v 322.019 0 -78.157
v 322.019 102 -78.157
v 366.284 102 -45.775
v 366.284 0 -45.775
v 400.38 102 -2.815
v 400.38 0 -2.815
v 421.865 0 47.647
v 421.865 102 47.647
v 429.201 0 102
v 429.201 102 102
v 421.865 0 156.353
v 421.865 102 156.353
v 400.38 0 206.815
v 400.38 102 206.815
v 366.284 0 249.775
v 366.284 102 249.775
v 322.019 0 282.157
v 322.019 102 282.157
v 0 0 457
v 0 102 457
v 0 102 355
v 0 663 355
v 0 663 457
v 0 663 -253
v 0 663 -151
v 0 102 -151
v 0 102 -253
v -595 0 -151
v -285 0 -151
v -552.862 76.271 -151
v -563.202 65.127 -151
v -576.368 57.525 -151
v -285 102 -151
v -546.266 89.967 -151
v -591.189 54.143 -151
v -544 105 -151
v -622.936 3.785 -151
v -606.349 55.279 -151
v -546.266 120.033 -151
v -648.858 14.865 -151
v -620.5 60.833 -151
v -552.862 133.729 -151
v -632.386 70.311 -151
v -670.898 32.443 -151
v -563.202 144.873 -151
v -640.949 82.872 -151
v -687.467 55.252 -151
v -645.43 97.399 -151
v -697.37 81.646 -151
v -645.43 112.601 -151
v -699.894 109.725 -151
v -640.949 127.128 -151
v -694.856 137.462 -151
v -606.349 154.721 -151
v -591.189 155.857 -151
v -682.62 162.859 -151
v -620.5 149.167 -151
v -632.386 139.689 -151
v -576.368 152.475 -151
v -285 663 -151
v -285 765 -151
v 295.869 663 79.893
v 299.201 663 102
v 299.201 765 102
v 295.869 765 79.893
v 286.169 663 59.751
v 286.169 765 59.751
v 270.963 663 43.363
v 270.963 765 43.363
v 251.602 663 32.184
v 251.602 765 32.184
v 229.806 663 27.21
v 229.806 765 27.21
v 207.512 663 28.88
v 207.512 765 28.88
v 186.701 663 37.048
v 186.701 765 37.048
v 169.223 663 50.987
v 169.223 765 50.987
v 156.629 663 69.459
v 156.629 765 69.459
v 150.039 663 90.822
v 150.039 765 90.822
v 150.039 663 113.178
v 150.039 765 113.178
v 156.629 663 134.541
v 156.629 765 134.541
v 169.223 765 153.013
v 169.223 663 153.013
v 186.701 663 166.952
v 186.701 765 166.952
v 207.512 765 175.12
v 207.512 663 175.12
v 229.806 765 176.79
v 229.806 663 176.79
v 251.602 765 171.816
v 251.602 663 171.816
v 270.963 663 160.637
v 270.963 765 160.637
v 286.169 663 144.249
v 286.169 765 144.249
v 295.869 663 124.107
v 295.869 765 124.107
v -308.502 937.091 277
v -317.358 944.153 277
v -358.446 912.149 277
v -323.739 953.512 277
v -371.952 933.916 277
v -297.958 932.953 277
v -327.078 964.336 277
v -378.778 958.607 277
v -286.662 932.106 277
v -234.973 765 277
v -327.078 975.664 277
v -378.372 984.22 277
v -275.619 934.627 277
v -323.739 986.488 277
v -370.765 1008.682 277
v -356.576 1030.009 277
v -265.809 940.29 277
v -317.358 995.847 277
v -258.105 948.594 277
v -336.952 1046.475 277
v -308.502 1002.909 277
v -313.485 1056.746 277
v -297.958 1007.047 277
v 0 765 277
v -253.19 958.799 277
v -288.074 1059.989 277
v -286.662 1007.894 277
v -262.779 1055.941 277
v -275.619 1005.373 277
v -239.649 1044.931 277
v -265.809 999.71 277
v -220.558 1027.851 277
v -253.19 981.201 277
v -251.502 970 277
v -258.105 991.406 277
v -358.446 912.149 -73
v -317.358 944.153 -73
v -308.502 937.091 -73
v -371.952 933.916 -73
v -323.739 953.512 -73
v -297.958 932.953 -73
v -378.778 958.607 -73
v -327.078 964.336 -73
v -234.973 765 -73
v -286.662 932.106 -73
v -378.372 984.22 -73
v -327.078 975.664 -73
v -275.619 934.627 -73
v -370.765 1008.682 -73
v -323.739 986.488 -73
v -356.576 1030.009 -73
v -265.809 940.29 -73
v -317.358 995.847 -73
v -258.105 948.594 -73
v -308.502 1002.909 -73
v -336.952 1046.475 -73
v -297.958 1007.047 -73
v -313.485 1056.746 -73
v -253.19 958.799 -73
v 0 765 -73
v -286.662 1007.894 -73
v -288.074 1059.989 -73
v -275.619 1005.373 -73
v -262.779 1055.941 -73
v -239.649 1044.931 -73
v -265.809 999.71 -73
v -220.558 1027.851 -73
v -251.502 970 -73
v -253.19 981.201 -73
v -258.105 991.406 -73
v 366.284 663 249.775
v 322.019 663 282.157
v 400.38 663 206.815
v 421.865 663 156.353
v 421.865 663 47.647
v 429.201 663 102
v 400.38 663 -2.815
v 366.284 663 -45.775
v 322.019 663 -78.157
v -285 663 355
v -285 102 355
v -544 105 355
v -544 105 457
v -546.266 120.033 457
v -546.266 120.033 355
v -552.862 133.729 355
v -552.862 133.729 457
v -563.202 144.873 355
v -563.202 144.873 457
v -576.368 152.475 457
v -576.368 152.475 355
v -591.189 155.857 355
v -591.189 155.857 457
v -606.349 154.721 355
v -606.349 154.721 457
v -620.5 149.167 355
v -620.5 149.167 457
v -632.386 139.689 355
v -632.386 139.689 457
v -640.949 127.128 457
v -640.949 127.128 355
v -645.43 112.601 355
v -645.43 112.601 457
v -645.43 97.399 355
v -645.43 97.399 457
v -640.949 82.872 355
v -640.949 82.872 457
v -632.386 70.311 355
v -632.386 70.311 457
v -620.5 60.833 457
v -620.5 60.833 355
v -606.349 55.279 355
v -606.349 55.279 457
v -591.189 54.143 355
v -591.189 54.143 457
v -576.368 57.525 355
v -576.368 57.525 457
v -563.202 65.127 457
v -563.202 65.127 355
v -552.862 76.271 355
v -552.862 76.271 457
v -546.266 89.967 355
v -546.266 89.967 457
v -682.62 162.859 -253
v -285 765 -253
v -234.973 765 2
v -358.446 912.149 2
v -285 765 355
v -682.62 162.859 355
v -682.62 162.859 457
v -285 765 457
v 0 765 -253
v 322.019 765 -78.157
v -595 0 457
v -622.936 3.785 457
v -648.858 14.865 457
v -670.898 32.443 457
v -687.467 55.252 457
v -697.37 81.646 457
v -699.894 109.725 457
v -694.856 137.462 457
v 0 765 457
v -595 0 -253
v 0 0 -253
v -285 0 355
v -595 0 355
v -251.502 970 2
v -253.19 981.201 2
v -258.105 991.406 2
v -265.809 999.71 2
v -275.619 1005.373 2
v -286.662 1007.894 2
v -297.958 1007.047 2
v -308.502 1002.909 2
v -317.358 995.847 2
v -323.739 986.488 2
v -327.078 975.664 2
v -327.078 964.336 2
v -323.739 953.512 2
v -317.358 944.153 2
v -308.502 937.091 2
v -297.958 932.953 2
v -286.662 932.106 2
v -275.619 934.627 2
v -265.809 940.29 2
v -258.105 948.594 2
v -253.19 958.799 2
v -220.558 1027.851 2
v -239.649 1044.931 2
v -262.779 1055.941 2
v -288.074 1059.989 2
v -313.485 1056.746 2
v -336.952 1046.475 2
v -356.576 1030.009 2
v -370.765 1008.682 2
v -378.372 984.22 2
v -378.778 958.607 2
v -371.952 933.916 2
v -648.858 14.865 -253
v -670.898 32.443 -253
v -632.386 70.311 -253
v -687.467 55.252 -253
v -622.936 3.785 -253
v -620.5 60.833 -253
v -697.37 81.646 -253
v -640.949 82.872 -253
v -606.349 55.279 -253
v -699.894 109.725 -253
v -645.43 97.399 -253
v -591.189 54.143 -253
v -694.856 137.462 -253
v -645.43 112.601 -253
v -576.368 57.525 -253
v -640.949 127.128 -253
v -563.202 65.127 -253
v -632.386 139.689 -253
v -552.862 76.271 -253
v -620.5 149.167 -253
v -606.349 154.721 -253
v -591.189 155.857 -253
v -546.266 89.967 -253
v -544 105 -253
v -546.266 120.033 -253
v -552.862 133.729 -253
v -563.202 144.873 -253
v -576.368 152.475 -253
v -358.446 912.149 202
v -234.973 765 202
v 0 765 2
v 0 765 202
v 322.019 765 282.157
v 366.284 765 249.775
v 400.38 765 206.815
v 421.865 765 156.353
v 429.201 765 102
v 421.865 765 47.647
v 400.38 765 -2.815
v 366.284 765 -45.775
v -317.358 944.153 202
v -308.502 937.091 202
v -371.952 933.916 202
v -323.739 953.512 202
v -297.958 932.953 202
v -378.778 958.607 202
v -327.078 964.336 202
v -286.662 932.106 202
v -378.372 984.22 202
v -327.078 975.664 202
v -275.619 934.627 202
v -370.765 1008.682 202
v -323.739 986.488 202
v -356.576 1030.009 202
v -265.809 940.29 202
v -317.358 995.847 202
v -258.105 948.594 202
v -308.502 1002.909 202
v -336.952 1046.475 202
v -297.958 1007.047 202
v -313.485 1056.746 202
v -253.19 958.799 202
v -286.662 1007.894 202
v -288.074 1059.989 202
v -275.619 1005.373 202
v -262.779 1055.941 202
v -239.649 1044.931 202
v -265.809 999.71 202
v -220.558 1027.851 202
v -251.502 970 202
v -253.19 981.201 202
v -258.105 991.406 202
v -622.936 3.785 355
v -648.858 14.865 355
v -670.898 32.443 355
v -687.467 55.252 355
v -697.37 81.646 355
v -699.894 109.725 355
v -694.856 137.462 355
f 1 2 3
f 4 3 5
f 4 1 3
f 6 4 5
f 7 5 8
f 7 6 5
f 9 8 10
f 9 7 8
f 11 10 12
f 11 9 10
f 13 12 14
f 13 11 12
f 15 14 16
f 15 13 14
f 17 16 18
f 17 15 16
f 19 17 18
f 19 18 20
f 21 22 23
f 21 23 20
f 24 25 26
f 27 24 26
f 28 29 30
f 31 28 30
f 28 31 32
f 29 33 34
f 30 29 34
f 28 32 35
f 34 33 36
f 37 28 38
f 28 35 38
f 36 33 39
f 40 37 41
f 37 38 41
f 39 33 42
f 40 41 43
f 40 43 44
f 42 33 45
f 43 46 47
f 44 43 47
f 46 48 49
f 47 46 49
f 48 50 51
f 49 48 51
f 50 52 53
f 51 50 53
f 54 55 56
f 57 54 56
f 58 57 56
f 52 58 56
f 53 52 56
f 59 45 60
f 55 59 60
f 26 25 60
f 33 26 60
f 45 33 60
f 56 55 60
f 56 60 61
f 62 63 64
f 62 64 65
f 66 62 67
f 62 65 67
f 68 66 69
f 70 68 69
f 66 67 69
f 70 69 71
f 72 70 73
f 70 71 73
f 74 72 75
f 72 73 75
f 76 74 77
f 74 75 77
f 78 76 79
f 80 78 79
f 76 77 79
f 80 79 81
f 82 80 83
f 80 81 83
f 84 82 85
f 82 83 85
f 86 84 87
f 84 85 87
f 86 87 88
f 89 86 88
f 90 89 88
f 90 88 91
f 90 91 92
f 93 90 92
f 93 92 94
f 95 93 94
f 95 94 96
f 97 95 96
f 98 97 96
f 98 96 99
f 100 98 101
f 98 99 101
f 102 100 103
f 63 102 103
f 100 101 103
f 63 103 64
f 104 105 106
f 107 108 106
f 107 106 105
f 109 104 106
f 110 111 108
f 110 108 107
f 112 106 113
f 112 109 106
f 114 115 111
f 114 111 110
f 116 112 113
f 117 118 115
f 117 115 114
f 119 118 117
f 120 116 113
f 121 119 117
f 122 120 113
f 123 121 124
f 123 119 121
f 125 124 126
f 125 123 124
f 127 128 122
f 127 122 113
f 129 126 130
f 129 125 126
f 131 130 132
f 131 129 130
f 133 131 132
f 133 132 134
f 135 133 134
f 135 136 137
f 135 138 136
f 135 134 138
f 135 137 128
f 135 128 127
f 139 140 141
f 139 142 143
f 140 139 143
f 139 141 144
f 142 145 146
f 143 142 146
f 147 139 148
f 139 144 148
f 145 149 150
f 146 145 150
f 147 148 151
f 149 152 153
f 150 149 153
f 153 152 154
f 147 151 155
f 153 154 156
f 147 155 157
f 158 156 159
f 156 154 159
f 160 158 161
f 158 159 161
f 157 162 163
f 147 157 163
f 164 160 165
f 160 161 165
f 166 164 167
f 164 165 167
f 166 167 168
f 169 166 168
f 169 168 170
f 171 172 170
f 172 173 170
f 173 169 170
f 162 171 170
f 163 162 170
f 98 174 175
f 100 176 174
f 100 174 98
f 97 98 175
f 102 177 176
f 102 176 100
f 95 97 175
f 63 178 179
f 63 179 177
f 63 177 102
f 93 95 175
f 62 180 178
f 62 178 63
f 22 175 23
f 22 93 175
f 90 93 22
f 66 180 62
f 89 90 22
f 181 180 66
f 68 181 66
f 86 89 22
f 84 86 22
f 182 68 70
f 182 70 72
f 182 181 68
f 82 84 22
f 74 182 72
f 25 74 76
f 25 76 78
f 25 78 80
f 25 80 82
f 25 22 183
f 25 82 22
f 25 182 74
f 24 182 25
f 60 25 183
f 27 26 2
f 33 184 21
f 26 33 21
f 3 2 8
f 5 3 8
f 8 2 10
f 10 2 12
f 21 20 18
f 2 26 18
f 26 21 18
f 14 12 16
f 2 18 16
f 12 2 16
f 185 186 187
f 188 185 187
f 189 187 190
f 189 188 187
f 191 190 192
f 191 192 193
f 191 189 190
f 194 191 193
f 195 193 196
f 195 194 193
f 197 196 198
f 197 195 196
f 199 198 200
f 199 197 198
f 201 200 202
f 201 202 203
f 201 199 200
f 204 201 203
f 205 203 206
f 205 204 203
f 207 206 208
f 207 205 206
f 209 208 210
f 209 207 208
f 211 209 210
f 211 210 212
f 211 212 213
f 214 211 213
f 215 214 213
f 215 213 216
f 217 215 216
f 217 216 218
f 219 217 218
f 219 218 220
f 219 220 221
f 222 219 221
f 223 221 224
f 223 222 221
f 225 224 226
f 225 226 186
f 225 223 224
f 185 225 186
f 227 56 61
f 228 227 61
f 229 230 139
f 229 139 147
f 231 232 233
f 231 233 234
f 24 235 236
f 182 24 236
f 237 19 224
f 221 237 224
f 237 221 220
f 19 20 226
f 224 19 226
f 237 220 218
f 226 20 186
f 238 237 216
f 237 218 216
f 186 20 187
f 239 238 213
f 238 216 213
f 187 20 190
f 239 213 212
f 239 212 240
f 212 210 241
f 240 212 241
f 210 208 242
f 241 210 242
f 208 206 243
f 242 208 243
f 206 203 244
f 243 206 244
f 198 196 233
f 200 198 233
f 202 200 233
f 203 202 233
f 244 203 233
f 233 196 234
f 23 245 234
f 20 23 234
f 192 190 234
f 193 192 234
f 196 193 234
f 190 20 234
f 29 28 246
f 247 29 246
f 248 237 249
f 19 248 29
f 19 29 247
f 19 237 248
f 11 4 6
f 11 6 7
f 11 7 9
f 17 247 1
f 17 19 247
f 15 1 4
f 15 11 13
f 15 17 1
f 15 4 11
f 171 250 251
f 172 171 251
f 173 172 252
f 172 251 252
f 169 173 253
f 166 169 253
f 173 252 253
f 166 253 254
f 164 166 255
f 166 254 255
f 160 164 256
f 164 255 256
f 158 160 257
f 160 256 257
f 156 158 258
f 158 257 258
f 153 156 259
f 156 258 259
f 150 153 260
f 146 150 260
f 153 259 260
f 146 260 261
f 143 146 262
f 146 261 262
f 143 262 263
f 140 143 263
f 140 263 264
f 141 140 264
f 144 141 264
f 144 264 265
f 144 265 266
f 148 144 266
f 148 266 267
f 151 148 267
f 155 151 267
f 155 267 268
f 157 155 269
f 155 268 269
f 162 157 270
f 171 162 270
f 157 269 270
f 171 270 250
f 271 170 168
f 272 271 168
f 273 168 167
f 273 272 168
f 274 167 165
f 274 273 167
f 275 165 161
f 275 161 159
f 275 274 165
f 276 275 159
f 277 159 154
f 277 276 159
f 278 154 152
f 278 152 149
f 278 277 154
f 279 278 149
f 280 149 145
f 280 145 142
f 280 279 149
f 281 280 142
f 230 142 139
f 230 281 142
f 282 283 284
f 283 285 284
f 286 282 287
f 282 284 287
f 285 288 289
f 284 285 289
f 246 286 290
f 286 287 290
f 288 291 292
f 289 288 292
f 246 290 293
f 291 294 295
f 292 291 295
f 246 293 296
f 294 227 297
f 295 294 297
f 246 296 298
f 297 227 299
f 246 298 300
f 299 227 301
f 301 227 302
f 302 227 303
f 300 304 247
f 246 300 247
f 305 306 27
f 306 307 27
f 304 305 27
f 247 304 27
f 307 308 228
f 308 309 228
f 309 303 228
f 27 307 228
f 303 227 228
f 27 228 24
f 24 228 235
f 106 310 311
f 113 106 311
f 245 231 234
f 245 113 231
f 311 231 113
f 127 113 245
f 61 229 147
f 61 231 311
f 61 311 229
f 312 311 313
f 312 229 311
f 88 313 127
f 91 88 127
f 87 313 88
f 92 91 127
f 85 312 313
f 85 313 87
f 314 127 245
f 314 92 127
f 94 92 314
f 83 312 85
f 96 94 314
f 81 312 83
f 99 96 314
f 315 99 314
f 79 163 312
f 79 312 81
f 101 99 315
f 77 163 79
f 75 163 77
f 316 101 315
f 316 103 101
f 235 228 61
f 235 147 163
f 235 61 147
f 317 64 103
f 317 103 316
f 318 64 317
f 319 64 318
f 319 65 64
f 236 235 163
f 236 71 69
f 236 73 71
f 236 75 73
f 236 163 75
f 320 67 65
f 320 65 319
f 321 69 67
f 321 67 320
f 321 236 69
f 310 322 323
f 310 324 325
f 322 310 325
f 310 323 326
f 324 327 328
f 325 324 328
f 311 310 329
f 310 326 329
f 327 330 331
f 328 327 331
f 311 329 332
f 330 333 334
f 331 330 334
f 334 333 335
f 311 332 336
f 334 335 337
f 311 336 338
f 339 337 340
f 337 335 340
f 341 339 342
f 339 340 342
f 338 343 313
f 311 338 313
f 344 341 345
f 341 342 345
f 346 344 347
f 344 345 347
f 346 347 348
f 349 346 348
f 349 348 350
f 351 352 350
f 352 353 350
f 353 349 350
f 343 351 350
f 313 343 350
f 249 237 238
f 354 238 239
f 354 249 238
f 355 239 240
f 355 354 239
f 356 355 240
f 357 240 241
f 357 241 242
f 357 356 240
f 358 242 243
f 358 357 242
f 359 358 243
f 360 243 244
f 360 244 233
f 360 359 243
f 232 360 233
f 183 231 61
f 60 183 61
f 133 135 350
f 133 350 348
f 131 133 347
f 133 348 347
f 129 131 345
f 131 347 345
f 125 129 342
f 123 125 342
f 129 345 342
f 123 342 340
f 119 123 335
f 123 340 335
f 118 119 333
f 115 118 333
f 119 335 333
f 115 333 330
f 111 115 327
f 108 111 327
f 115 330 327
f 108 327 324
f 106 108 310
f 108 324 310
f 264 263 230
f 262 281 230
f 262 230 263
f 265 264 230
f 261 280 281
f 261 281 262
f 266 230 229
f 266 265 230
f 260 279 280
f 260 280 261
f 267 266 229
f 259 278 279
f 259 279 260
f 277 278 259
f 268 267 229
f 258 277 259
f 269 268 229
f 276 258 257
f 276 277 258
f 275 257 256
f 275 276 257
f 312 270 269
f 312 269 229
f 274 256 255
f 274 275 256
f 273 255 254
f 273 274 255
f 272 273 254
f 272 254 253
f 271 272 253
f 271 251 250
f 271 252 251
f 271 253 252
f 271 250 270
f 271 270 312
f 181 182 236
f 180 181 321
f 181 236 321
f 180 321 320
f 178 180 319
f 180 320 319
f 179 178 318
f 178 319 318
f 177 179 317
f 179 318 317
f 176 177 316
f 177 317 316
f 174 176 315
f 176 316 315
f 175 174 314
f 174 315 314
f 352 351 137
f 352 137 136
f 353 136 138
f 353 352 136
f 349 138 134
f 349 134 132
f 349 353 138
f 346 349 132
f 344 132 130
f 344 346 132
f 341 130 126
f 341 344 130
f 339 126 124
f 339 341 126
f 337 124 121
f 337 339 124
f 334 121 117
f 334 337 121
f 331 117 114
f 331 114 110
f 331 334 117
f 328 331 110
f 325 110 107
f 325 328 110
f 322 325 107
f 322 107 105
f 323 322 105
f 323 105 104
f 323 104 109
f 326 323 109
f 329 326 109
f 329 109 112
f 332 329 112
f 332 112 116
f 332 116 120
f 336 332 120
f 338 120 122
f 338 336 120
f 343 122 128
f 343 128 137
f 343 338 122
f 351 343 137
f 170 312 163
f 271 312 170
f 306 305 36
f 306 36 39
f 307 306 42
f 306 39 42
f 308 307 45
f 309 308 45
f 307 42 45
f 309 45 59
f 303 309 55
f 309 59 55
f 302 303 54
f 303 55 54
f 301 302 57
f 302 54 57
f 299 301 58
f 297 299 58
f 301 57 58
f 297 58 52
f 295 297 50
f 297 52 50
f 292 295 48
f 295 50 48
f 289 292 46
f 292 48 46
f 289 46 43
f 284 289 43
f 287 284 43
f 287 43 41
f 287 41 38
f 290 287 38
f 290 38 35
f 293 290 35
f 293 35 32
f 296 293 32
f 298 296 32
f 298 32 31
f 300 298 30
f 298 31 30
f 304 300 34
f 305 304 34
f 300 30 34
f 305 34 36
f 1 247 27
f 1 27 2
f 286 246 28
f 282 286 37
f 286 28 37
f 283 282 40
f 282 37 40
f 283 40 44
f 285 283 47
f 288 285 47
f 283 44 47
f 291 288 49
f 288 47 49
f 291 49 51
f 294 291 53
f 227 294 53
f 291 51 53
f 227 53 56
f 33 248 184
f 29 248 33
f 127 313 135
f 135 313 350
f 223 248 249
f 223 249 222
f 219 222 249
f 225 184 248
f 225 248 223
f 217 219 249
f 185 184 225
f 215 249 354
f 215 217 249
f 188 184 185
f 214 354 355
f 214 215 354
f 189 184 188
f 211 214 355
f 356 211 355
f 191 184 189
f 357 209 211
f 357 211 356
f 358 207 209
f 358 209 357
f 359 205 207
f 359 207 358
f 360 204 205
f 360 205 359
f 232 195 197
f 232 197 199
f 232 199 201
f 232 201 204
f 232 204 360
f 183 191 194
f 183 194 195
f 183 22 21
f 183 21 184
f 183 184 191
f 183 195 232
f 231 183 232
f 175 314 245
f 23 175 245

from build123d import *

# Parameters (mm, degrees)
SKETCH2_R           = 51
BOSS_EXTRUDE1_DEPTH = 102
SKETCH3_R           = 75
BOSS_EXTRUDE2_DEPTH = 102
BOSS_EXTRUDE3_DEPTH = 102
BOSS_EXTRUDE7_START = 100
SKETCH17_R          = 38
BOSS_EXTRUDE7_DEPTH = 75


with BuildPart() as part:
    # Sketch2 → Boss-Extrude1 (new body)
    with BuildSketch(Plane.XY.offset(355)):
        with BuildLine():
            Line((-285, 765), (0, 765))
            Line((0, 765), (0, 0))
            Line((0, 0), (-595, 0))
            ThreePointArc((-595, 0), (-687.466864274, 55.251844141), (-682.620113823, 162.859447402))
            Line((-682.620113823, 162.859447402), (-285, 765))
        make_face()
        with Locations((-595, 105)):
            Circle(SKETCH2_R, mode=Mode.SUBTRACT)
    boss_extrude1 = extrude(amount=BOSS_EXTRUDE1_DEPTH)

    # Sketch3 → Boss-Extrude2 (add)
    with BuildSketch(Plane(origin=(0, 765, 0), x_dir=(1, 0, 0), z_dir=(0, 1, 0))):
        with BuildLine():
            Line((0, -457), (-285, -457))
            Line((-285, -457), (-285, 253))
            Line((-285, 253), (0, 253))
            Line((0, 253), (322.019203343, 78.15740693))
            ThreePointArc((322.019203343, 78.15740693), (429.201471167, -102), (322.019203343, -282.15740693))
            Line((322.019203343, -282.15740693), (0, -457))
        make_face()
        with Locations((224.201471167, -102)):
            Circle(SKETCH3_R, mode=Mode.SUBTRACT)
    extrude(amount=-BOSS_EXTRUDE2_DEPTH)

    # Mirror2: Boss-Extrude1 across plane
    add(boss_extrude1.mirror(Plane.XY.offset(102)))

    # Sketch9 → Boss-Extrude3 (add)
    with BuildSketch(Plane.XZ):
        with BuildLine():
            Line((0, -151), (0, -253))
            Line((0, -253), (322.019203343, -78.15740693))
            ThreePointArc((322.019203343, -78.15740693), (429.201471167, 102), (322.019203343, 282.15740693))
            Line((322.019203343, 282.15740693), (0, 457))
            Line((0, 457), (0, 355))
            Line((0, 355), (-285, 355))
            Line((-285, 355), (-285, -151))
            Line((-285, -151), (0, -151))
        make_face()
    extrude(amount=-BOSS_EXTRUDE3_DEPTH)

    # Sketch17 → Boss-Extrude7 (add)
    with BuildSketch(Plane.XY.offset(102).offset(BOSS_EXTRUDE7_START)):
        with BuildLine():
            Line((-234.97331208, 765), (0, 765))
            Line((0, 765), (-220.558080551, 1027.850884872))
            ThreePointArc((-220.558080551, 1027.850884872), (-347.352965303, 1038.943999881), (-358.446080312, 912.149115128))
            Line((-358.446080312, 912.149115128), (-234.97331208, 765))
        make_face()
        with Locations((-289.502080431, 970)):
            Circle(SKETCH17_R, mode=Mode.SUBTRACT)
    boss_extrude7 = extrude(amount=BOSS_EXTRUDE7_DEPTH)

    # Mirror5: Boss-Extrude7 across plane
    add(boss_extrude7.mirror(Plane.XY.offset(102)))


solid = part.part
